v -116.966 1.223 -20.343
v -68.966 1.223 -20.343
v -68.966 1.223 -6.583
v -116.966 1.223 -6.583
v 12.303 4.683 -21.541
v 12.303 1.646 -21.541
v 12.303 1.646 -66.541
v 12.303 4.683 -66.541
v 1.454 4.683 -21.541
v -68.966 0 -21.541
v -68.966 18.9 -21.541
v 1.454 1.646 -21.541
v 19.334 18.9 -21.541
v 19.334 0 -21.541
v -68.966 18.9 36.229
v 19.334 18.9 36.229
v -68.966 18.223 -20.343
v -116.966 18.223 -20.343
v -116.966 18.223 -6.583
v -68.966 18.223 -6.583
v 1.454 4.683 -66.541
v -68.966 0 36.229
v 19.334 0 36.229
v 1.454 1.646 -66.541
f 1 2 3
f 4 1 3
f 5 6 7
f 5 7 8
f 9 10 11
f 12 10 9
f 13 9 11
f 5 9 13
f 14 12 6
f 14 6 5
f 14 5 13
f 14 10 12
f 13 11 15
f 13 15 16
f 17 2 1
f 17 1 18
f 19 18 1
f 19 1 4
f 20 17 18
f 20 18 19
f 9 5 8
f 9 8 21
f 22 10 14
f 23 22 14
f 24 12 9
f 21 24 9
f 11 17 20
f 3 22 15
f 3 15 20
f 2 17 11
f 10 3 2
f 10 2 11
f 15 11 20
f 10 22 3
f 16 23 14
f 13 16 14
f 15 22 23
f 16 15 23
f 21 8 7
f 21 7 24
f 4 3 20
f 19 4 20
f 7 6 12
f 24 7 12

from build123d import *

# Parameters (mm, degrees)
SKETCH_1_W      = 88.3
SKETCH_1_H      = 57.77
EXTRUDE_1_DEPTH = 18.9
SKETCH_2_W      = 13.76
SKETCH_2_H      = 17
EXTRUDE_2_DEPTH = 48
SKETCH_3_W      = 10.848746397
SKETCH_3_H      = 3.037648992
EXTRUDE_3_DEPTH = 45


with BuildPart() as part:
    # Эскиз1 → Бобышка-Вытянуть1 (new body)
    with BuildSketch(Plane(origin=(0, 0, 0), x_dir=(1, 0, 0), z_dir=(0, 1, 0))):
        with Locations((-24.816331195, -7.343762185)):
            Rectangle(SKETCH_1_W, SKETCH_1_H)
    extrude(amount=EXTRUDE_1_DEPTH)

    # Эскиз2 → Бобышка-Вытянуть2 (add)
    with BuildSketch(Plane.ZY.offset(68.966331195)):
        with Locations((-13.462732009, 9.722786208)):
            Rectangle(SKETCH_2_W, SKETCH_2_H)
    extrude(amount=EXTRUDE_2_DEPTH)

    # Эскиз3 → Бобышка-Вытянуть3 (add)
    with BuildSketch(Plane(origin=(0, 0, -21.541237815), x_dir=(-1, 0, 0), z_dir=(0, 0, -1))):
        with Locations((-6.878820548, 3.164454924)):
            Rectangle(SKETCH_3_W, SKETCH_3_H)
    extrude(amount=EXTRUDE_3_DEPTH)


solid = part.part
